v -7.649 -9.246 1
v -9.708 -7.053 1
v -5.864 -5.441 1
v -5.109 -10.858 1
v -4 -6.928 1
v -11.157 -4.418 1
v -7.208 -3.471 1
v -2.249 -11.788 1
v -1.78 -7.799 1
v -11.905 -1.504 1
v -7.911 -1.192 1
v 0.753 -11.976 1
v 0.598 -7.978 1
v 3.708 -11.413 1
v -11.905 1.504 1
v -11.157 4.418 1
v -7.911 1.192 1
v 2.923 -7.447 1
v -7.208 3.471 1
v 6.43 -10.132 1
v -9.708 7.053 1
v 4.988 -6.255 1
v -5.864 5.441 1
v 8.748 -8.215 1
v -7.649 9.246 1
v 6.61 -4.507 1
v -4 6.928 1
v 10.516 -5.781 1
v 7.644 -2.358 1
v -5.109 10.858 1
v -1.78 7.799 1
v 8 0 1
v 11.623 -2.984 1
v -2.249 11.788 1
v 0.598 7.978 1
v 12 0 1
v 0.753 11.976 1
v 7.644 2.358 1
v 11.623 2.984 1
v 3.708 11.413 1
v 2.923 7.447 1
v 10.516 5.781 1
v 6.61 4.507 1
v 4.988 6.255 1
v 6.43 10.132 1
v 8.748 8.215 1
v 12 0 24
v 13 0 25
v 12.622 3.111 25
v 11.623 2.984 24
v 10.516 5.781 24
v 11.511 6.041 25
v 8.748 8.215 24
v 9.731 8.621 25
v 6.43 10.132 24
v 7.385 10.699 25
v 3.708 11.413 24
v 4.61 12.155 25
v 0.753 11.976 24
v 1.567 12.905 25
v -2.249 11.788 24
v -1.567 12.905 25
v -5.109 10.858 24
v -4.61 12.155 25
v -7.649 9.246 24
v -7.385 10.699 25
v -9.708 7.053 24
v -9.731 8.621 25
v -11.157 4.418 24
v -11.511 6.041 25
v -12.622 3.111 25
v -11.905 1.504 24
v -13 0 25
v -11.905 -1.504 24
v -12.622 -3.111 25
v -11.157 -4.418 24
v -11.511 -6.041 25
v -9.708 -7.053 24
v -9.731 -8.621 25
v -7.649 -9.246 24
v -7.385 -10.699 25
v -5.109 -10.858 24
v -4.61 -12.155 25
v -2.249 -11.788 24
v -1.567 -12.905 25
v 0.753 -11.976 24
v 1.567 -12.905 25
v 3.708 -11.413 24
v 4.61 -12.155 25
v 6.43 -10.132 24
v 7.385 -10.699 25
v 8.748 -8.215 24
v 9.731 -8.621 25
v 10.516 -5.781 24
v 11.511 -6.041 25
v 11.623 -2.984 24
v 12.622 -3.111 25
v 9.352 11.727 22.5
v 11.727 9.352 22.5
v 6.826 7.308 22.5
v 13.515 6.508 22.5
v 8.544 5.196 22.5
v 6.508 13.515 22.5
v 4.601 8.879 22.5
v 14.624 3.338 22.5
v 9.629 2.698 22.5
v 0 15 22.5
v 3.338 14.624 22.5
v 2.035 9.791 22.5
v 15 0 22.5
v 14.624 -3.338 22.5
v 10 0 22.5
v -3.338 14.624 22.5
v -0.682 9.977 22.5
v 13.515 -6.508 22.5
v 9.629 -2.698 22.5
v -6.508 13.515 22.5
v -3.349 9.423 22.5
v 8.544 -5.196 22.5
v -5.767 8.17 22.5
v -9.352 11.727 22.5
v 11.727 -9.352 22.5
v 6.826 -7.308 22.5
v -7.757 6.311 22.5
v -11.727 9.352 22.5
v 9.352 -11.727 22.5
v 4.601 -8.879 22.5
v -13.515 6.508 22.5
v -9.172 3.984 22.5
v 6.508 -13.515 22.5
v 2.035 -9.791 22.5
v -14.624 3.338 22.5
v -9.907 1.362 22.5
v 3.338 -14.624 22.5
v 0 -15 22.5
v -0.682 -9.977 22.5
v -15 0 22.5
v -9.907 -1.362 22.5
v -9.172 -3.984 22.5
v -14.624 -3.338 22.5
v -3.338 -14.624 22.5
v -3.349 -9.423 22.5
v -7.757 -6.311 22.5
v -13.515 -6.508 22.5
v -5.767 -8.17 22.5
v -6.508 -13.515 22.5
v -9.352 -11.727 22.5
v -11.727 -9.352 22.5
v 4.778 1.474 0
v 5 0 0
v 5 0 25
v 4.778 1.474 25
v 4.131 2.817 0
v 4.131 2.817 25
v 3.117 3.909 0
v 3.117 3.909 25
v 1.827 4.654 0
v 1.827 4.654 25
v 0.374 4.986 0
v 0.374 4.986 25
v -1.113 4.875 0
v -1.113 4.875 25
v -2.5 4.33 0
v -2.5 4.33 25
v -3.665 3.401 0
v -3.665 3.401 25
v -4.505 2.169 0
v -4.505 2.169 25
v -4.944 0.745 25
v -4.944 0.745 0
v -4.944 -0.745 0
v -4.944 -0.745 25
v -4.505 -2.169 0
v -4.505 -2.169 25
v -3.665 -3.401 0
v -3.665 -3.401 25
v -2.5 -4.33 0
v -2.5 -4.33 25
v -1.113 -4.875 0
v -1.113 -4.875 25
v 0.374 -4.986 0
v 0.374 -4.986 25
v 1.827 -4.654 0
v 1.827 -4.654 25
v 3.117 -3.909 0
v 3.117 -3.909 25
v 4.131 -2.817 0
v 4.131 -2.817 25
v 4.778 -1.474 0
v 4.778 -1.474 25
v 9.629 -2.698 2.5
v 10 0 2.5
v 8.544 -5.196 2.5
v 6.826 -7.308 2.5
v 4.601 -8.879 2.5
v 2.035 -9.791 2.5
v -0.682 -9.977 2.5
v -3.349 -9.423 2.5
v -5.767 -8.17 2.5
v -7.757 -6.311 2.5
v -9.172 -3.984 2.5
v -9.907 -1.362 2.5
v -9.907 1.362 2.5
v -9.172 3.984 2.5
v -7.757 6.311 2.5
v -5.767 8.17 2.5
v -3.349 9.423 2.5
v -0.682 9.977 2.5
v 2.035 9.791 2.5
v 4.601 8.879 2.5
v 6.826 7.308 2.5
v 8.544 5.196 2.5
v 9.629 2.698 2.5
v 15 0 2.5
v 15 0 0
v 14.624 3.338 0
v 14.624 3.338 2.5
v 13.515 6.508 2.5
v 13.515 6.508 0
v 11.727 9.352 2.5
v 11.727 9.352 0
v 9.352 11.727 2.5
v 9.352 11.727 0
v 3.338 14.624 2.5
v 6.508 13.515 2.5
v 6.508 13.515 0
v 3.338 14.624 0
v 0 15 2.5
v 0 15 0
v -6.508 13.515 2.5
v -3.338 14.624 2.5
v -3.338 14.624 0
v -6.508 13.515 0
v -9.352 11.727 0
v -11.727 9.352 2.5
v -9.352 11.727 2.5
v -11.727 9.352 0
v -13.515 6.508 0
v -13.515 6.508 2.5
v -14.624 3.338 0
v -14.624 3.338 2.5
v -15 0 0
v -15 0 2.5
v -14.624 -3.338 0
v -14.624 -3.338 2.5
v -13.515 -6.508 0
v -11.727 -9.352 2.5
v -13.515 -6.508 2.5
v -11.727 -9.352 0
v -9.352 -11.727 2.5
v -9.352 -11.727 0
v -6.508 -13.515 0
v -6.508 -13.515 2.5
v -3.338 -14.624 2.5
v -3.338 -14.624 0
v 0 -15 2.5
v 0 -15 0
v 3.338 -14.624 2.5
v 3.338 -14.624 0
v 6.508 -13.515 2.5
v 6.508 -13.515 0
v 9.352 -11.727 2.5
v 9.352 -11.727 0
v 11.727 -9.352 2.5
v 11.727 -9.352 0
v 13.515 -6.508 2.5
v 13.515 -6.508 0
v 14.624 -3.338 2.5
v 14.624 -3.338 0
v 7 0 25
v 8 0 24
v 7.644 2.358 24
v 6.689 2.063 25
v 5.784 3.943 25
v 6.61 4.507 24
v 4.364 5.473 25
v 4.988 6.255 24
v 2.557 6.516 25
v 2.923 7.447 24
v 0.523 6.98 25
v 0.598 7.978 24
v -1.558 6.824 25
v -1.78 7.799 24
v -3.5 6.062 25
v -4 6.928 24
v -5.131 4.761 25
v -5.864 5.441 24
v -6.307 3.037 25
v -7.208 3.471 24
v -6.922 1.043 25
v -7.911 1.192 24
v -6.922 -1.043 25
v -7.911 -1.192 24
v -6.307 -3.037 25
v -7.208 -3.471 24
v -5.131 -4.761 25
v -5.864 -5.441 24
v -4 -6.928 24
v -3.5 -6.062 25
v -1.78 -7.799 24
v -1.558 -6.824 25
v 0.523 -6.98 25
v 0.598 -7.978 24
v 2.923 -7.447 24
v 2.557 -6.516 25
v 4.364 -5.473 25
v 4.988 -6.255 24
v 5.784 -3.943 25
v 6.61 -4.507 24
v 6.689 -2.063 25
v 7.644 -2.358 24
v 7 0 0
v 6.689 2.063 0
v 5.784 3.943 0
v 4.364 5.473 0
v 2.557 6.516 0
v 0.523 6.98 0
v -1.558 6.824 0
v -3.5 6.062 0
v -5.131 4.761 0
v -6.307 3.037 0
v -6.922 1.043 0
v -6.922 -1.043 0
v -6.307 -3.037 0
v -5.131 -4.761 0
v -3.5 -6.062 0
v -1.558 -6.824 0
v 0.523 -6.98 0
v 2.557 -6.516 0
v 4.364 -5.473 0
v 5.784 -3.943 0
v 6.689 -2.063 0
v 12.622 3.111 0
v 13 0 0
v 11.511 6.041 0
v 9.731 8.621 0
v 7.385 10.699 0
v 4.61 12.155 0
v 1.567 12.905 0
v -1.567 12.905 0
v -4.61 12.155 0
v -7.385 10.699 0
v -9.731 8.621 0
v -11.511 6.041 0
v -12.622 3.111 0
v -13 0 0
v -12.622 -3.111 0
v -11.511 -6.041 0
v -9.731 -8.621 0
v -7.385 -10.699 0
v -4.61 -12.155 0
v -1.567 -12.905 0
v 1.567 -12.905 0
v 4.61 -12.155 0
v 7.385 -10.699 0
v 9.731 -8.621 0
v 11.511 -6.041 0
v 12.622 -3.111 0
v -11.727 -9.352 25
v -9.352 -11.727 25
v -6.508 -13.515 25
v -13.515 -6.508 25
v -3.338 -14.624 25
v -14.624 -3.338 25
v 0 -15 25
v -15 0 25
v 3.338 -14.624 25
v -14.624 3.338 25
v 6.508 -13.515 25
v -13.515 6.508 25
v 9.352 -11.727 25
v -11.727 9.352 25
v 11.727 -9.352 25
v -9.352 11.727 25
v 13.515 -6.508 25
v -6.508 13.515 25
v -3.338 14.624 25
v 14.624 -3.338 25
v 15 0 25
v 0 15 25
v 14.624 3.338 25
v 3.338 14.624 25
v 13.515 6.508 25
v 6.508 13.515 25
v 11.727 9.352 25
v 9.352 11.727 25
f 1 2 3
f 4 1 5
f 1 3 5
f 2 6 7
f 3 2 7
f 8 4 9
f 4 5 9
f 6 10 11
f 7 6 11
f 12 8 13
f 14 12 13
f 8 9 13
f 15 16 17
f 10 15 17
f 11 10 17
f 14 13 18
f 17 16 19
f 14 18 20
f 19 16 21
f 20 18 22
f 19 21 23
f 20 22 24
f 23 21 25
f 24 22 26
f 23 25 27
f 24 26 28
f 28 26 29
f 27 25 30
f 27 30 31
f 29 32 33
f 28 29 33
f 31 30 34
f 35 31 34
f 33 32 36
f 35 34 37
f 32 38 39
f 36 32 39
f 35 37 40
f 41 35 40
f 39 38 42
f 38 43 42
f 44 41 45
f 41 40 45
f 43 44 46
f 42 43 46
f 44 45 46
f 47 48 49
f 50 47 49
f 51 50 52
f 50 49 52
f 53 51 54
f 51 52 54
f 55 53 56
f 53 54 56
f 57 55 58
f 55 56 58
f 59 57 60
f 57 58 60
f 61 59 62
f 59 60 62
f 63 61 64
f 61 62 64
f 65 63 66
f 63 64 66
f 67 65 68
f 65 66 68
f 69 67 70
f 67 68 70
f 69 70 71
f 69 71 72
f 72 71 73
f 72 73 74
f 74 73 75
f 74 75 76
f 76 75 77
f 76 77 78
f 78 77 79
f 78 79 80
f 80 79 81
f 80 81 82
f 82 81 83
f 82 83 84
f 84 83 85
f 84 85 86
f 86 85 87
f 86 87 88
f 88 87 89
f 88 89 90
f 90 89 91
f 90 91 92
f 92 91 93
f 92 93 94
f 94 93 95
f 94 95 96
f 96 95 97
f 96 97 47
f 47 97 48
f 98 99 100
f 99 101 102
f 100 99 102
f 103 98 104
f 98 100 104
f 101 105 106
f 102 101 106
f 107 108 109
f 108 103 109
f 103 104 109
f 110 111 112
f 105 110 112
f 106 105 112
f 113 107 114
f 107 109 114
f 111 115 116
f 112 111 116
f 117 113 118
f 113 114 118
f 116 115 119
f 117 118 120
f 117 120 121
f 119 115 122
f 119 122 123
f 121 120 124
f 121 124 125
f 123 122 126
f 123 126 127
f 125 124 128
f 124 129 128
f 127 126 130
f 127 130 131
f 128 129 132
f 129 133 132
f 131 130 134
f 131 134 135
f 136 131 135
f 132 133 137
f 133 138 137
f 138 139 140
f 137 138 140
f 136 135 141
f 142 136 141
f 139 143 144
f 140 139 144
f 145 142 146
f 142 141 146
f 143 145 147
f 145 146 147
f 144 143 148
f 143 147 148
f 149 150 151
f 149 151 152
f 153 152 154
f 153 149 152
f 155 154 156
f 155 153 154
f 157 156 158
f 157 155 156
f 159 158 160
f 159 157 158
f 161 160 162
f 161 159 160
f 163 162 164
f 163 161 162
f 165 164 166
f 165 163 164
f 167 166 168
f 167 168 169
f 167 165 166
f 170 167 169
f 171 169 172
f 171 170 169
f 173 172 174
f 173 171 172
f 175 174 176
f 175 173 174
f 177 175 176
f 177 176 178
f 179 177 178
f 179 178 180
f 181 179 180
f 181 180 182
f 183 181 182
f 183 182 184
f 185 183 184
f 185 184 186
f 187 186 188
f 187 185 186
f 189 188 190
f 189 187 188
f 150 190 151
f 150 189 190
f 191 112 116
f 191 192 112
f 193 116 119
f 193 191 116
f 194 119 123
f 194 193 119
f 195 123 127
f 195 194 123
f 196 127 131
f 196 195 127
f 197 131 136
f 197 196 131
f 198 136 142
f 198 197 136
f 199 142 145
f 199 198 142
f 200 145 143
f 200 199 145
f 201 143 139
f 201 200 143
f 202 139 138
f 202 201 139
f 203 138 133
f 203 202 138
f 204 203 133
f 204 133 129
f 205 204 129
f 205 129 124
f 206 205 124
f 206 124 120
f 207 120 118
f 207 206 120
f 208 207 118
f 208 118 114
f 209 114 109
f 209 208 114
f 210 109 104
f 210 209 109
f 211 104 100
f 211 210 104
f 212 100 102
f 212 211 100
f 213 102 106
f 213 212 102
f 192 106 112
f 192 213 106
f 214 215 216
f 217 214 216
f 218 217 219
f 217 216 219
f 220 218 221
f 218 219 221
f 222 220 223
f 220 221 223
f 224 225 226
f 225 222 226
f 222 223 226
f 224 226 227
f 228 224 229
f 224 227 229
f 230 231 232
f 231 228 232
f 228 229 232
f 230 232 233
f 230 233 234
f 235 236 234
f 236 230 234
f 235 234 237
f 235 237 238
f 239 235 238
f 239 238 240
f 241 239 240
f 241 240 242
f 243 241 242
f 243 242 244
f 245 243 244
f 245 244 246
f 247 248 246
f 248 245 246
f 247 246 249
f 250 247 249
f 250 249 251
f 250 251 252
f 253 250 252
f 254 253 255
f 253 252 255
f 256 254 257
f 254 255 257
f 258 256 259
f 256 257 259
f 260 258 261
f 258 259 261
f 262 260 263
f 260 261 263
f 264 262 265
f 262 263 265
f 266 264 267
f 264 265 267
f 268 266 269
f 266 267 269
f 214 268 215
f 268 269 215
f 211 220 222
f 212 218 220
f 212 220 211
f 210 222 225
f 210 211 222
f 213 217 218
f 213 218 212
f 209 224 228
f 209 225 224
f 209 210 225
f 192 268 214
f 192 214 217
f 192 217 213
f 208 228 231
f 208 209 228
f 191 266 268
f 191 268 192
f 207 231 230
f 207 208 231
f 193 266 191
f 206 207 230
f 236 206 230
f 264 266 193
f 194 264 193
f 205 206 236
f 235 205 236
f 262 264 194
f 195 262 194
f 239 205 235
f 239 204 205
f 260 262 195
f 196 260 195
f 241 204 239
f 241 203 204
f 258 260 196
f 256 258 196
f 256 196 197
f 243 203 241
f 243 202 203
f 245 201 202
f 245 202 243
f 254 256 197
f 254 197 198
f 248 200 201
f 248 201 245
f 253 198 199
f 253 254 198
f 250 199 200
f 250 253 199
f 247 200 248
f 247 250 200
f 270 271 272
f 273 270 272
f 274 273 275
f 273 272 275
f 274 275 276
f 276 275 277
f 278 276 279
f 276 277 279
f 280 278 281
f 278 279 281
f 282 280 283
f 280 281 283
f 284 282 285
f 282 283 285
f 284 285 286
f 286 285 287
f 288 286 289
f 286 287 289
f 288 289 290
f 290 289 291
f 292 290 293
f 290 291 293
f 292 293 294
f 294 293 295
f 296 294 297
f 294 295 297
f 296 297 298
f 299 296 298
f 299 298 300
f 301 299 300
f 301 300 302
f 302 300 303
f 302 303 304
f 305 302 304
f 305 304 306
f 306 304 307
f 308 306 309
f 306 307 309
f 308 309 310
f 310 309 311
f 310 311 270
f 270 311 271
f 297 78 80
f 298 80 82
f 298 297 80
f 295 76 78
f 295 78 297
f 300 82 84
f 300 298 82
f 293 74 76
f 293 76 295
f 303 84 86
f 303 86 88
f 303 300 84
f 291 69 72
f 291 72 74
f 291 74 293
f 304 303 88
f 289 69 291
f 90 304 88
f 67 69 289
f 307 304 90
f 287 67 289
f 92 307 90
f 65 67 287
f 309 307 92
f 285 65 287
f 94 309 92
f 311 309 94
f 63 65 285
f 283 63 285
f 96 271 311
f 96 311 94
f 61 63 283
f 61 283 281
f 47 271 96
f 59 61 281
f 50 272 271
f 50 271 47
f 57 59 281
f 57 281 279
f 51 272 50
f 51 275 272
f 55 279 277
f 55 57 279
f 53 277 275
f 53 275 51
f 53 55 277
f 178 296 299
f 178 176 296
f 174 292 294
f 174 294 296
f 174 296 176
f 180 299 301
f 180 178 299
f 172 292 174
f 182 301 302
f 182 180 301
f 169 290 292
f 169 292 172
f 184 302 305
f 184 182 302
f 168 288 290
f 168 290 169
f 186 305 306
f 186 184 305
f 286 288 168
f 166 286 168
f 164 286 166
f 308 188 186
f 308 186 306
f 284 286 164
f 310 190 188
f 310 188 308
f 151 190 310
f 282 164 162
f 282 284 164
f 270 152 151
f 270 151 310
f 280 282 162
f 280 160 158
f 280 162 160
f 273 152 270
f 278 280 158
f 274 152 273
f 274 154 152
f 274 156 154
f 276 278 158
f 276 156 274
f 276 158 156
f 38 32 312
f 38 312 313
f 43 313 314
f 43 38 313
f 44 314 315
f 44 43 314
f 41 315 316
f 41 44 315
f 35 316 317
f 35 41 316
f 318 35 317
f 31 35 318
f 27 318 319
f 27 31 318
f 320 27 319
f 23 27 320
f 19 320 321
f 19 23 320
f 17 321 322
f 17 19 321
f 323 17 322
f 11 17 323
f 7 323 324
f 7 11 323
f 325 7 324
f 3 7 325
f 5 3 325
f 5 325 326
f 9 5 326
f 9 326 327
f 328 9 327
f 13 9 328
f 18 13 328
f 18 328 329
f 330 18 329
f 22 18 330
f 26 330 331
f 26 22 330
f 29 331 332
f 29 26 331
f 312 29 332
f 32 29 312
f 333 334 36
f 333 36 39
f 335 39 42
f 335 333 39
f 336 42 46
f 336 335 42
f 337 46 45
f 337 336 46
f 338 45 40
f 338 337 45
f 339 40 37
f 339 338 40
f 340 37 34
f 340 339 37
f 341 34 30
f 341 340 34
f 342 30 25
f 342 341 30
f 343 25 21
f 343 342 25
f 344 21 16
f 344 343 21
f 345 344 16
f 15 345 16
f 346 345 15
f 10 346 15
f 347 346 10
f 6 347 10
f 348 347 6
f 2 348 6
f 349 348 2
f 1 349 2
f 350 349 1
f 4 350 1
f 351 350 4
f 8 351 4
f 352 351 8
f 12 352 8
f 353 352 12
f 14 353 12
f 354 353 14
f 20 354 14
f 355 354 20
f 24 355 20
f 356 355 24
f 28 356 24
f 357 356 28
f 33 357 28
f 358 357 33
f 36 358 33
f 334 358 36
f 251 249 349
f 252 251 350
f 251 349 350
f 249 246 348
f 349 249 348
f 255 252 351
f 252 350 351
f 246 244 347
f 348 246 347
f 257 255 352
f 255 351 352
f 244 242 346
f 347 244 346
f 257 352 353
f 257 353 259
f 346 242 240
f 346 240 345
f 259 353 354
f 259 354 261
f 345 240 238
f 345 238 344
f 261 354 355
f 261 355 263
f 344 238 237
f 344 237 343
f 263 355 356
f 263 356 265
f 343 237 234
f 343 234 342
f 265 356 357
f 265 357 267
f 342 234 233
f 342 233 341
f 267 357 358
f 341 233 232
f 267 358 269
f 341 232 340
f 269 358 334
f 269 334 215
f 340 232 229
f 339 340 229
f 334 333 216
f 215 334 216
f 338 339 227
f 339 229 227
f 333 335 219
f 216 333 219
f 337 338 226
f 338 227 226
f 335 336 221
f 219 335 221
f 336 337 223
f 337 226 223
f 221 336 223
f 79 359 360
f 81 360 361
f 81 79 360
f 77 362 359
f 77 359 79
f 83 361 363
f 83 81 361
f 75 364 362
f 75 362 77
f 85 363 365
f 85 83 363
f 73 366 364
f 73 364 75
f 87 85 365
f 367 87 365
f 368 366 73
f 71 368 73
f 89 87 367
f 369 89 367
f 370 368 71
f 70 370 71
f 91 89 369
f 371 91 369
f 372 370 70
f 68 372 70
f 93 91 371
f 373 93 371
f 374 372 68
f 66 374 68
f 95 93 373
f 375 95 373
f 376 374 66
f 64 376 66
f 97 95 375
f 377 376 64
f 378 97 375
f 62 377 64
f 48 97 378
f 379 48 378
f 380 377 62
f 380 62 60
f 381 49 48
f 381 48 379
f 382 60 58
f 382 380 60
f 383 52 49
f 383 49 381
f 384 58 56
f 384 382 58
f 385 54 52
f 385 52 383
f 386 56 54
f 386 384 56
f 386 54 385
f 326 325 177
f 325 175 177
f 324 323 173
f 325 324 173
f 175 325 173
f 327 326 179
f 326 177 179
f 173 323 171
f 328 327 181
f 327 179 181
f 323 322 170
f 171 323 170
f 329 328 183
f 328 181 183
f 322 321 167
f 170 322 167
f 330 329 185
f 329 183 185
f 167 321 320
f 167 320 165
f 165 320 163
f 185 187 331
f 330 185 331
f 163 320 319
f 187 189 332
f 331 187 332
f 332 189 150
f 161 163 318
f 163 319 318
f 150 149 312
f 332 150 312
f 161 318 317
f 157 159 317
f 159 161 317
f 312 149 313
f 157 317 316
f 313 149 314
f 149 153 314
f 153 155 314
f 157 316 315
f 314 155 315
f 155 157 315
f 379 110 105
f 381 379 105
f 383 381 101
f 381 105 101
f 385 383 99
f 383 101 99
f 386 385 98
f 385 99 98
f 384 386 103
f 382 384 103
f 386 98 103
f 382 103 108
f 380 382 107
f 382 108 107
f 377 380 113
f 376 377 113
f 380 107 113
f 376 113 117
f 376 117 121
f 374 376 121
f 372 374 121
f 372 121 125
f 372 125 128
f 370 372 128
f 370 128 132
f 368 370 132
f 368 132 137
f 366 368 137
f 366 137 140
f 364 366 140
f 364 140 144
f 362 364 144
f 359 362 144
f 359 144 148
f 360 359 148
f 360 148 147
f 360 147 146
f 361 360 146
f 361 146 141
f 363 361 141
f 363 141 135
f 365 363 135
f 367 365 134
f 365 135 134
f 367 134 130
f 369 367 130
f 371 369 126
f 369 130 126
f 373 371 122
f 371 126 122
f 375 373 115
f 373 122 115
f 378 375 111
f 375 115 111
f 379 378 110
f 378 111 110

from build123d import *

# Parameters (mm, degrees)
CROQUIS1_R                 = 15
CROQUIS1_R_2               = 5
SALIENTE_EXTRUIR1_DEPTH    = 25
CROQUIS3_W                 = 20
CROQUIS3_H                 = 10
CROQUIS4_R                 = 13
CROQUIS4_R_2               = 7
CORTAR_EXTRUIR1_DEPTH      = 1
CHAFL_N1_SIZE              = 1
CHAFL_N1_OF_SIMETR_A2_SIZE = 1


with BuildPart() as part:
    # Croquis1 → Saliente-Extruir1 (new body)
    with BuildSketch(Plane.XY):
        Circle(CROQUIS1_R)
        Circle(CROQUIS1_R_2, mode=Mode.SUBTRACT)
    extrude(amount=SALIENTE_EXTRUIR1_DEPTH)

    # Croquis3 → Cortar-Revolución1 (revolve, cut)
    with BuildSketch(Plane(origin=(0, 0, 0), x_dir=(0, 0, -1), z_dir=(1, 0, 0)), mode=Mode.PRIVATE) as cortar_revoluci_n1_sk:
        with Locations((-12.5, 15)):
            Rectangle(CROQUIS3_W, CROQUIS3_H)
    revolve(cortar_revoluci_n1_sk.sketch.rotate(Axis((0, 0, 25), (0, 0, -1)), 90), axis=Axis((0, 0, 25), (0, 0, -1)), mode=Mode.SUBTRACT)

    # Croquis4 → Cortar-Extruir1 (cut)
    with BuildSketch(Plane.XY.offset(25)):
        Circle(CROQUIS4_R)
        Circle(CROQUIS4_R_2, mode=Mode.SUBTRACT)
    cortar_extruir1 = extrude(amount=-CORTAR_EXTRUIR1_DEPTH, mode=Mode.SUBTRACT)

    # Chaflán1
    chafl_n1_edges = [part.edges().sort_by_distance(p)[0] for p in [
        (-13, 0, 24),
        (-7, 0, 24),
    ]]
    chamfer(chafl_n1_edges, length=CHAFL_N1_SIZE - 0.0001)  # a hair under: the kernel refuses the full size

    # Simetría2: Cortar-Extruir1 across plane
    add(cortar_extruir1.mirror(Plane.XY.offset(12.5)), mode=Mode.SUBTRACT)

    # Chaflán1 of Simetría2
    chafl_n1_of_simetr_a2_edges = [part.edges().sort_by_distance(p)[0] for p in [
        (-13, 0, 1),
        (-7, 0, 1),
    ]]
    chamfer(chafl_n1_of_simetr_a2_edges, length=CHAFL_N1_OF_SIMETR_A2_SIZE - 0.0001)  # a hair under: the kernel refuses the full size


solid = part.part
